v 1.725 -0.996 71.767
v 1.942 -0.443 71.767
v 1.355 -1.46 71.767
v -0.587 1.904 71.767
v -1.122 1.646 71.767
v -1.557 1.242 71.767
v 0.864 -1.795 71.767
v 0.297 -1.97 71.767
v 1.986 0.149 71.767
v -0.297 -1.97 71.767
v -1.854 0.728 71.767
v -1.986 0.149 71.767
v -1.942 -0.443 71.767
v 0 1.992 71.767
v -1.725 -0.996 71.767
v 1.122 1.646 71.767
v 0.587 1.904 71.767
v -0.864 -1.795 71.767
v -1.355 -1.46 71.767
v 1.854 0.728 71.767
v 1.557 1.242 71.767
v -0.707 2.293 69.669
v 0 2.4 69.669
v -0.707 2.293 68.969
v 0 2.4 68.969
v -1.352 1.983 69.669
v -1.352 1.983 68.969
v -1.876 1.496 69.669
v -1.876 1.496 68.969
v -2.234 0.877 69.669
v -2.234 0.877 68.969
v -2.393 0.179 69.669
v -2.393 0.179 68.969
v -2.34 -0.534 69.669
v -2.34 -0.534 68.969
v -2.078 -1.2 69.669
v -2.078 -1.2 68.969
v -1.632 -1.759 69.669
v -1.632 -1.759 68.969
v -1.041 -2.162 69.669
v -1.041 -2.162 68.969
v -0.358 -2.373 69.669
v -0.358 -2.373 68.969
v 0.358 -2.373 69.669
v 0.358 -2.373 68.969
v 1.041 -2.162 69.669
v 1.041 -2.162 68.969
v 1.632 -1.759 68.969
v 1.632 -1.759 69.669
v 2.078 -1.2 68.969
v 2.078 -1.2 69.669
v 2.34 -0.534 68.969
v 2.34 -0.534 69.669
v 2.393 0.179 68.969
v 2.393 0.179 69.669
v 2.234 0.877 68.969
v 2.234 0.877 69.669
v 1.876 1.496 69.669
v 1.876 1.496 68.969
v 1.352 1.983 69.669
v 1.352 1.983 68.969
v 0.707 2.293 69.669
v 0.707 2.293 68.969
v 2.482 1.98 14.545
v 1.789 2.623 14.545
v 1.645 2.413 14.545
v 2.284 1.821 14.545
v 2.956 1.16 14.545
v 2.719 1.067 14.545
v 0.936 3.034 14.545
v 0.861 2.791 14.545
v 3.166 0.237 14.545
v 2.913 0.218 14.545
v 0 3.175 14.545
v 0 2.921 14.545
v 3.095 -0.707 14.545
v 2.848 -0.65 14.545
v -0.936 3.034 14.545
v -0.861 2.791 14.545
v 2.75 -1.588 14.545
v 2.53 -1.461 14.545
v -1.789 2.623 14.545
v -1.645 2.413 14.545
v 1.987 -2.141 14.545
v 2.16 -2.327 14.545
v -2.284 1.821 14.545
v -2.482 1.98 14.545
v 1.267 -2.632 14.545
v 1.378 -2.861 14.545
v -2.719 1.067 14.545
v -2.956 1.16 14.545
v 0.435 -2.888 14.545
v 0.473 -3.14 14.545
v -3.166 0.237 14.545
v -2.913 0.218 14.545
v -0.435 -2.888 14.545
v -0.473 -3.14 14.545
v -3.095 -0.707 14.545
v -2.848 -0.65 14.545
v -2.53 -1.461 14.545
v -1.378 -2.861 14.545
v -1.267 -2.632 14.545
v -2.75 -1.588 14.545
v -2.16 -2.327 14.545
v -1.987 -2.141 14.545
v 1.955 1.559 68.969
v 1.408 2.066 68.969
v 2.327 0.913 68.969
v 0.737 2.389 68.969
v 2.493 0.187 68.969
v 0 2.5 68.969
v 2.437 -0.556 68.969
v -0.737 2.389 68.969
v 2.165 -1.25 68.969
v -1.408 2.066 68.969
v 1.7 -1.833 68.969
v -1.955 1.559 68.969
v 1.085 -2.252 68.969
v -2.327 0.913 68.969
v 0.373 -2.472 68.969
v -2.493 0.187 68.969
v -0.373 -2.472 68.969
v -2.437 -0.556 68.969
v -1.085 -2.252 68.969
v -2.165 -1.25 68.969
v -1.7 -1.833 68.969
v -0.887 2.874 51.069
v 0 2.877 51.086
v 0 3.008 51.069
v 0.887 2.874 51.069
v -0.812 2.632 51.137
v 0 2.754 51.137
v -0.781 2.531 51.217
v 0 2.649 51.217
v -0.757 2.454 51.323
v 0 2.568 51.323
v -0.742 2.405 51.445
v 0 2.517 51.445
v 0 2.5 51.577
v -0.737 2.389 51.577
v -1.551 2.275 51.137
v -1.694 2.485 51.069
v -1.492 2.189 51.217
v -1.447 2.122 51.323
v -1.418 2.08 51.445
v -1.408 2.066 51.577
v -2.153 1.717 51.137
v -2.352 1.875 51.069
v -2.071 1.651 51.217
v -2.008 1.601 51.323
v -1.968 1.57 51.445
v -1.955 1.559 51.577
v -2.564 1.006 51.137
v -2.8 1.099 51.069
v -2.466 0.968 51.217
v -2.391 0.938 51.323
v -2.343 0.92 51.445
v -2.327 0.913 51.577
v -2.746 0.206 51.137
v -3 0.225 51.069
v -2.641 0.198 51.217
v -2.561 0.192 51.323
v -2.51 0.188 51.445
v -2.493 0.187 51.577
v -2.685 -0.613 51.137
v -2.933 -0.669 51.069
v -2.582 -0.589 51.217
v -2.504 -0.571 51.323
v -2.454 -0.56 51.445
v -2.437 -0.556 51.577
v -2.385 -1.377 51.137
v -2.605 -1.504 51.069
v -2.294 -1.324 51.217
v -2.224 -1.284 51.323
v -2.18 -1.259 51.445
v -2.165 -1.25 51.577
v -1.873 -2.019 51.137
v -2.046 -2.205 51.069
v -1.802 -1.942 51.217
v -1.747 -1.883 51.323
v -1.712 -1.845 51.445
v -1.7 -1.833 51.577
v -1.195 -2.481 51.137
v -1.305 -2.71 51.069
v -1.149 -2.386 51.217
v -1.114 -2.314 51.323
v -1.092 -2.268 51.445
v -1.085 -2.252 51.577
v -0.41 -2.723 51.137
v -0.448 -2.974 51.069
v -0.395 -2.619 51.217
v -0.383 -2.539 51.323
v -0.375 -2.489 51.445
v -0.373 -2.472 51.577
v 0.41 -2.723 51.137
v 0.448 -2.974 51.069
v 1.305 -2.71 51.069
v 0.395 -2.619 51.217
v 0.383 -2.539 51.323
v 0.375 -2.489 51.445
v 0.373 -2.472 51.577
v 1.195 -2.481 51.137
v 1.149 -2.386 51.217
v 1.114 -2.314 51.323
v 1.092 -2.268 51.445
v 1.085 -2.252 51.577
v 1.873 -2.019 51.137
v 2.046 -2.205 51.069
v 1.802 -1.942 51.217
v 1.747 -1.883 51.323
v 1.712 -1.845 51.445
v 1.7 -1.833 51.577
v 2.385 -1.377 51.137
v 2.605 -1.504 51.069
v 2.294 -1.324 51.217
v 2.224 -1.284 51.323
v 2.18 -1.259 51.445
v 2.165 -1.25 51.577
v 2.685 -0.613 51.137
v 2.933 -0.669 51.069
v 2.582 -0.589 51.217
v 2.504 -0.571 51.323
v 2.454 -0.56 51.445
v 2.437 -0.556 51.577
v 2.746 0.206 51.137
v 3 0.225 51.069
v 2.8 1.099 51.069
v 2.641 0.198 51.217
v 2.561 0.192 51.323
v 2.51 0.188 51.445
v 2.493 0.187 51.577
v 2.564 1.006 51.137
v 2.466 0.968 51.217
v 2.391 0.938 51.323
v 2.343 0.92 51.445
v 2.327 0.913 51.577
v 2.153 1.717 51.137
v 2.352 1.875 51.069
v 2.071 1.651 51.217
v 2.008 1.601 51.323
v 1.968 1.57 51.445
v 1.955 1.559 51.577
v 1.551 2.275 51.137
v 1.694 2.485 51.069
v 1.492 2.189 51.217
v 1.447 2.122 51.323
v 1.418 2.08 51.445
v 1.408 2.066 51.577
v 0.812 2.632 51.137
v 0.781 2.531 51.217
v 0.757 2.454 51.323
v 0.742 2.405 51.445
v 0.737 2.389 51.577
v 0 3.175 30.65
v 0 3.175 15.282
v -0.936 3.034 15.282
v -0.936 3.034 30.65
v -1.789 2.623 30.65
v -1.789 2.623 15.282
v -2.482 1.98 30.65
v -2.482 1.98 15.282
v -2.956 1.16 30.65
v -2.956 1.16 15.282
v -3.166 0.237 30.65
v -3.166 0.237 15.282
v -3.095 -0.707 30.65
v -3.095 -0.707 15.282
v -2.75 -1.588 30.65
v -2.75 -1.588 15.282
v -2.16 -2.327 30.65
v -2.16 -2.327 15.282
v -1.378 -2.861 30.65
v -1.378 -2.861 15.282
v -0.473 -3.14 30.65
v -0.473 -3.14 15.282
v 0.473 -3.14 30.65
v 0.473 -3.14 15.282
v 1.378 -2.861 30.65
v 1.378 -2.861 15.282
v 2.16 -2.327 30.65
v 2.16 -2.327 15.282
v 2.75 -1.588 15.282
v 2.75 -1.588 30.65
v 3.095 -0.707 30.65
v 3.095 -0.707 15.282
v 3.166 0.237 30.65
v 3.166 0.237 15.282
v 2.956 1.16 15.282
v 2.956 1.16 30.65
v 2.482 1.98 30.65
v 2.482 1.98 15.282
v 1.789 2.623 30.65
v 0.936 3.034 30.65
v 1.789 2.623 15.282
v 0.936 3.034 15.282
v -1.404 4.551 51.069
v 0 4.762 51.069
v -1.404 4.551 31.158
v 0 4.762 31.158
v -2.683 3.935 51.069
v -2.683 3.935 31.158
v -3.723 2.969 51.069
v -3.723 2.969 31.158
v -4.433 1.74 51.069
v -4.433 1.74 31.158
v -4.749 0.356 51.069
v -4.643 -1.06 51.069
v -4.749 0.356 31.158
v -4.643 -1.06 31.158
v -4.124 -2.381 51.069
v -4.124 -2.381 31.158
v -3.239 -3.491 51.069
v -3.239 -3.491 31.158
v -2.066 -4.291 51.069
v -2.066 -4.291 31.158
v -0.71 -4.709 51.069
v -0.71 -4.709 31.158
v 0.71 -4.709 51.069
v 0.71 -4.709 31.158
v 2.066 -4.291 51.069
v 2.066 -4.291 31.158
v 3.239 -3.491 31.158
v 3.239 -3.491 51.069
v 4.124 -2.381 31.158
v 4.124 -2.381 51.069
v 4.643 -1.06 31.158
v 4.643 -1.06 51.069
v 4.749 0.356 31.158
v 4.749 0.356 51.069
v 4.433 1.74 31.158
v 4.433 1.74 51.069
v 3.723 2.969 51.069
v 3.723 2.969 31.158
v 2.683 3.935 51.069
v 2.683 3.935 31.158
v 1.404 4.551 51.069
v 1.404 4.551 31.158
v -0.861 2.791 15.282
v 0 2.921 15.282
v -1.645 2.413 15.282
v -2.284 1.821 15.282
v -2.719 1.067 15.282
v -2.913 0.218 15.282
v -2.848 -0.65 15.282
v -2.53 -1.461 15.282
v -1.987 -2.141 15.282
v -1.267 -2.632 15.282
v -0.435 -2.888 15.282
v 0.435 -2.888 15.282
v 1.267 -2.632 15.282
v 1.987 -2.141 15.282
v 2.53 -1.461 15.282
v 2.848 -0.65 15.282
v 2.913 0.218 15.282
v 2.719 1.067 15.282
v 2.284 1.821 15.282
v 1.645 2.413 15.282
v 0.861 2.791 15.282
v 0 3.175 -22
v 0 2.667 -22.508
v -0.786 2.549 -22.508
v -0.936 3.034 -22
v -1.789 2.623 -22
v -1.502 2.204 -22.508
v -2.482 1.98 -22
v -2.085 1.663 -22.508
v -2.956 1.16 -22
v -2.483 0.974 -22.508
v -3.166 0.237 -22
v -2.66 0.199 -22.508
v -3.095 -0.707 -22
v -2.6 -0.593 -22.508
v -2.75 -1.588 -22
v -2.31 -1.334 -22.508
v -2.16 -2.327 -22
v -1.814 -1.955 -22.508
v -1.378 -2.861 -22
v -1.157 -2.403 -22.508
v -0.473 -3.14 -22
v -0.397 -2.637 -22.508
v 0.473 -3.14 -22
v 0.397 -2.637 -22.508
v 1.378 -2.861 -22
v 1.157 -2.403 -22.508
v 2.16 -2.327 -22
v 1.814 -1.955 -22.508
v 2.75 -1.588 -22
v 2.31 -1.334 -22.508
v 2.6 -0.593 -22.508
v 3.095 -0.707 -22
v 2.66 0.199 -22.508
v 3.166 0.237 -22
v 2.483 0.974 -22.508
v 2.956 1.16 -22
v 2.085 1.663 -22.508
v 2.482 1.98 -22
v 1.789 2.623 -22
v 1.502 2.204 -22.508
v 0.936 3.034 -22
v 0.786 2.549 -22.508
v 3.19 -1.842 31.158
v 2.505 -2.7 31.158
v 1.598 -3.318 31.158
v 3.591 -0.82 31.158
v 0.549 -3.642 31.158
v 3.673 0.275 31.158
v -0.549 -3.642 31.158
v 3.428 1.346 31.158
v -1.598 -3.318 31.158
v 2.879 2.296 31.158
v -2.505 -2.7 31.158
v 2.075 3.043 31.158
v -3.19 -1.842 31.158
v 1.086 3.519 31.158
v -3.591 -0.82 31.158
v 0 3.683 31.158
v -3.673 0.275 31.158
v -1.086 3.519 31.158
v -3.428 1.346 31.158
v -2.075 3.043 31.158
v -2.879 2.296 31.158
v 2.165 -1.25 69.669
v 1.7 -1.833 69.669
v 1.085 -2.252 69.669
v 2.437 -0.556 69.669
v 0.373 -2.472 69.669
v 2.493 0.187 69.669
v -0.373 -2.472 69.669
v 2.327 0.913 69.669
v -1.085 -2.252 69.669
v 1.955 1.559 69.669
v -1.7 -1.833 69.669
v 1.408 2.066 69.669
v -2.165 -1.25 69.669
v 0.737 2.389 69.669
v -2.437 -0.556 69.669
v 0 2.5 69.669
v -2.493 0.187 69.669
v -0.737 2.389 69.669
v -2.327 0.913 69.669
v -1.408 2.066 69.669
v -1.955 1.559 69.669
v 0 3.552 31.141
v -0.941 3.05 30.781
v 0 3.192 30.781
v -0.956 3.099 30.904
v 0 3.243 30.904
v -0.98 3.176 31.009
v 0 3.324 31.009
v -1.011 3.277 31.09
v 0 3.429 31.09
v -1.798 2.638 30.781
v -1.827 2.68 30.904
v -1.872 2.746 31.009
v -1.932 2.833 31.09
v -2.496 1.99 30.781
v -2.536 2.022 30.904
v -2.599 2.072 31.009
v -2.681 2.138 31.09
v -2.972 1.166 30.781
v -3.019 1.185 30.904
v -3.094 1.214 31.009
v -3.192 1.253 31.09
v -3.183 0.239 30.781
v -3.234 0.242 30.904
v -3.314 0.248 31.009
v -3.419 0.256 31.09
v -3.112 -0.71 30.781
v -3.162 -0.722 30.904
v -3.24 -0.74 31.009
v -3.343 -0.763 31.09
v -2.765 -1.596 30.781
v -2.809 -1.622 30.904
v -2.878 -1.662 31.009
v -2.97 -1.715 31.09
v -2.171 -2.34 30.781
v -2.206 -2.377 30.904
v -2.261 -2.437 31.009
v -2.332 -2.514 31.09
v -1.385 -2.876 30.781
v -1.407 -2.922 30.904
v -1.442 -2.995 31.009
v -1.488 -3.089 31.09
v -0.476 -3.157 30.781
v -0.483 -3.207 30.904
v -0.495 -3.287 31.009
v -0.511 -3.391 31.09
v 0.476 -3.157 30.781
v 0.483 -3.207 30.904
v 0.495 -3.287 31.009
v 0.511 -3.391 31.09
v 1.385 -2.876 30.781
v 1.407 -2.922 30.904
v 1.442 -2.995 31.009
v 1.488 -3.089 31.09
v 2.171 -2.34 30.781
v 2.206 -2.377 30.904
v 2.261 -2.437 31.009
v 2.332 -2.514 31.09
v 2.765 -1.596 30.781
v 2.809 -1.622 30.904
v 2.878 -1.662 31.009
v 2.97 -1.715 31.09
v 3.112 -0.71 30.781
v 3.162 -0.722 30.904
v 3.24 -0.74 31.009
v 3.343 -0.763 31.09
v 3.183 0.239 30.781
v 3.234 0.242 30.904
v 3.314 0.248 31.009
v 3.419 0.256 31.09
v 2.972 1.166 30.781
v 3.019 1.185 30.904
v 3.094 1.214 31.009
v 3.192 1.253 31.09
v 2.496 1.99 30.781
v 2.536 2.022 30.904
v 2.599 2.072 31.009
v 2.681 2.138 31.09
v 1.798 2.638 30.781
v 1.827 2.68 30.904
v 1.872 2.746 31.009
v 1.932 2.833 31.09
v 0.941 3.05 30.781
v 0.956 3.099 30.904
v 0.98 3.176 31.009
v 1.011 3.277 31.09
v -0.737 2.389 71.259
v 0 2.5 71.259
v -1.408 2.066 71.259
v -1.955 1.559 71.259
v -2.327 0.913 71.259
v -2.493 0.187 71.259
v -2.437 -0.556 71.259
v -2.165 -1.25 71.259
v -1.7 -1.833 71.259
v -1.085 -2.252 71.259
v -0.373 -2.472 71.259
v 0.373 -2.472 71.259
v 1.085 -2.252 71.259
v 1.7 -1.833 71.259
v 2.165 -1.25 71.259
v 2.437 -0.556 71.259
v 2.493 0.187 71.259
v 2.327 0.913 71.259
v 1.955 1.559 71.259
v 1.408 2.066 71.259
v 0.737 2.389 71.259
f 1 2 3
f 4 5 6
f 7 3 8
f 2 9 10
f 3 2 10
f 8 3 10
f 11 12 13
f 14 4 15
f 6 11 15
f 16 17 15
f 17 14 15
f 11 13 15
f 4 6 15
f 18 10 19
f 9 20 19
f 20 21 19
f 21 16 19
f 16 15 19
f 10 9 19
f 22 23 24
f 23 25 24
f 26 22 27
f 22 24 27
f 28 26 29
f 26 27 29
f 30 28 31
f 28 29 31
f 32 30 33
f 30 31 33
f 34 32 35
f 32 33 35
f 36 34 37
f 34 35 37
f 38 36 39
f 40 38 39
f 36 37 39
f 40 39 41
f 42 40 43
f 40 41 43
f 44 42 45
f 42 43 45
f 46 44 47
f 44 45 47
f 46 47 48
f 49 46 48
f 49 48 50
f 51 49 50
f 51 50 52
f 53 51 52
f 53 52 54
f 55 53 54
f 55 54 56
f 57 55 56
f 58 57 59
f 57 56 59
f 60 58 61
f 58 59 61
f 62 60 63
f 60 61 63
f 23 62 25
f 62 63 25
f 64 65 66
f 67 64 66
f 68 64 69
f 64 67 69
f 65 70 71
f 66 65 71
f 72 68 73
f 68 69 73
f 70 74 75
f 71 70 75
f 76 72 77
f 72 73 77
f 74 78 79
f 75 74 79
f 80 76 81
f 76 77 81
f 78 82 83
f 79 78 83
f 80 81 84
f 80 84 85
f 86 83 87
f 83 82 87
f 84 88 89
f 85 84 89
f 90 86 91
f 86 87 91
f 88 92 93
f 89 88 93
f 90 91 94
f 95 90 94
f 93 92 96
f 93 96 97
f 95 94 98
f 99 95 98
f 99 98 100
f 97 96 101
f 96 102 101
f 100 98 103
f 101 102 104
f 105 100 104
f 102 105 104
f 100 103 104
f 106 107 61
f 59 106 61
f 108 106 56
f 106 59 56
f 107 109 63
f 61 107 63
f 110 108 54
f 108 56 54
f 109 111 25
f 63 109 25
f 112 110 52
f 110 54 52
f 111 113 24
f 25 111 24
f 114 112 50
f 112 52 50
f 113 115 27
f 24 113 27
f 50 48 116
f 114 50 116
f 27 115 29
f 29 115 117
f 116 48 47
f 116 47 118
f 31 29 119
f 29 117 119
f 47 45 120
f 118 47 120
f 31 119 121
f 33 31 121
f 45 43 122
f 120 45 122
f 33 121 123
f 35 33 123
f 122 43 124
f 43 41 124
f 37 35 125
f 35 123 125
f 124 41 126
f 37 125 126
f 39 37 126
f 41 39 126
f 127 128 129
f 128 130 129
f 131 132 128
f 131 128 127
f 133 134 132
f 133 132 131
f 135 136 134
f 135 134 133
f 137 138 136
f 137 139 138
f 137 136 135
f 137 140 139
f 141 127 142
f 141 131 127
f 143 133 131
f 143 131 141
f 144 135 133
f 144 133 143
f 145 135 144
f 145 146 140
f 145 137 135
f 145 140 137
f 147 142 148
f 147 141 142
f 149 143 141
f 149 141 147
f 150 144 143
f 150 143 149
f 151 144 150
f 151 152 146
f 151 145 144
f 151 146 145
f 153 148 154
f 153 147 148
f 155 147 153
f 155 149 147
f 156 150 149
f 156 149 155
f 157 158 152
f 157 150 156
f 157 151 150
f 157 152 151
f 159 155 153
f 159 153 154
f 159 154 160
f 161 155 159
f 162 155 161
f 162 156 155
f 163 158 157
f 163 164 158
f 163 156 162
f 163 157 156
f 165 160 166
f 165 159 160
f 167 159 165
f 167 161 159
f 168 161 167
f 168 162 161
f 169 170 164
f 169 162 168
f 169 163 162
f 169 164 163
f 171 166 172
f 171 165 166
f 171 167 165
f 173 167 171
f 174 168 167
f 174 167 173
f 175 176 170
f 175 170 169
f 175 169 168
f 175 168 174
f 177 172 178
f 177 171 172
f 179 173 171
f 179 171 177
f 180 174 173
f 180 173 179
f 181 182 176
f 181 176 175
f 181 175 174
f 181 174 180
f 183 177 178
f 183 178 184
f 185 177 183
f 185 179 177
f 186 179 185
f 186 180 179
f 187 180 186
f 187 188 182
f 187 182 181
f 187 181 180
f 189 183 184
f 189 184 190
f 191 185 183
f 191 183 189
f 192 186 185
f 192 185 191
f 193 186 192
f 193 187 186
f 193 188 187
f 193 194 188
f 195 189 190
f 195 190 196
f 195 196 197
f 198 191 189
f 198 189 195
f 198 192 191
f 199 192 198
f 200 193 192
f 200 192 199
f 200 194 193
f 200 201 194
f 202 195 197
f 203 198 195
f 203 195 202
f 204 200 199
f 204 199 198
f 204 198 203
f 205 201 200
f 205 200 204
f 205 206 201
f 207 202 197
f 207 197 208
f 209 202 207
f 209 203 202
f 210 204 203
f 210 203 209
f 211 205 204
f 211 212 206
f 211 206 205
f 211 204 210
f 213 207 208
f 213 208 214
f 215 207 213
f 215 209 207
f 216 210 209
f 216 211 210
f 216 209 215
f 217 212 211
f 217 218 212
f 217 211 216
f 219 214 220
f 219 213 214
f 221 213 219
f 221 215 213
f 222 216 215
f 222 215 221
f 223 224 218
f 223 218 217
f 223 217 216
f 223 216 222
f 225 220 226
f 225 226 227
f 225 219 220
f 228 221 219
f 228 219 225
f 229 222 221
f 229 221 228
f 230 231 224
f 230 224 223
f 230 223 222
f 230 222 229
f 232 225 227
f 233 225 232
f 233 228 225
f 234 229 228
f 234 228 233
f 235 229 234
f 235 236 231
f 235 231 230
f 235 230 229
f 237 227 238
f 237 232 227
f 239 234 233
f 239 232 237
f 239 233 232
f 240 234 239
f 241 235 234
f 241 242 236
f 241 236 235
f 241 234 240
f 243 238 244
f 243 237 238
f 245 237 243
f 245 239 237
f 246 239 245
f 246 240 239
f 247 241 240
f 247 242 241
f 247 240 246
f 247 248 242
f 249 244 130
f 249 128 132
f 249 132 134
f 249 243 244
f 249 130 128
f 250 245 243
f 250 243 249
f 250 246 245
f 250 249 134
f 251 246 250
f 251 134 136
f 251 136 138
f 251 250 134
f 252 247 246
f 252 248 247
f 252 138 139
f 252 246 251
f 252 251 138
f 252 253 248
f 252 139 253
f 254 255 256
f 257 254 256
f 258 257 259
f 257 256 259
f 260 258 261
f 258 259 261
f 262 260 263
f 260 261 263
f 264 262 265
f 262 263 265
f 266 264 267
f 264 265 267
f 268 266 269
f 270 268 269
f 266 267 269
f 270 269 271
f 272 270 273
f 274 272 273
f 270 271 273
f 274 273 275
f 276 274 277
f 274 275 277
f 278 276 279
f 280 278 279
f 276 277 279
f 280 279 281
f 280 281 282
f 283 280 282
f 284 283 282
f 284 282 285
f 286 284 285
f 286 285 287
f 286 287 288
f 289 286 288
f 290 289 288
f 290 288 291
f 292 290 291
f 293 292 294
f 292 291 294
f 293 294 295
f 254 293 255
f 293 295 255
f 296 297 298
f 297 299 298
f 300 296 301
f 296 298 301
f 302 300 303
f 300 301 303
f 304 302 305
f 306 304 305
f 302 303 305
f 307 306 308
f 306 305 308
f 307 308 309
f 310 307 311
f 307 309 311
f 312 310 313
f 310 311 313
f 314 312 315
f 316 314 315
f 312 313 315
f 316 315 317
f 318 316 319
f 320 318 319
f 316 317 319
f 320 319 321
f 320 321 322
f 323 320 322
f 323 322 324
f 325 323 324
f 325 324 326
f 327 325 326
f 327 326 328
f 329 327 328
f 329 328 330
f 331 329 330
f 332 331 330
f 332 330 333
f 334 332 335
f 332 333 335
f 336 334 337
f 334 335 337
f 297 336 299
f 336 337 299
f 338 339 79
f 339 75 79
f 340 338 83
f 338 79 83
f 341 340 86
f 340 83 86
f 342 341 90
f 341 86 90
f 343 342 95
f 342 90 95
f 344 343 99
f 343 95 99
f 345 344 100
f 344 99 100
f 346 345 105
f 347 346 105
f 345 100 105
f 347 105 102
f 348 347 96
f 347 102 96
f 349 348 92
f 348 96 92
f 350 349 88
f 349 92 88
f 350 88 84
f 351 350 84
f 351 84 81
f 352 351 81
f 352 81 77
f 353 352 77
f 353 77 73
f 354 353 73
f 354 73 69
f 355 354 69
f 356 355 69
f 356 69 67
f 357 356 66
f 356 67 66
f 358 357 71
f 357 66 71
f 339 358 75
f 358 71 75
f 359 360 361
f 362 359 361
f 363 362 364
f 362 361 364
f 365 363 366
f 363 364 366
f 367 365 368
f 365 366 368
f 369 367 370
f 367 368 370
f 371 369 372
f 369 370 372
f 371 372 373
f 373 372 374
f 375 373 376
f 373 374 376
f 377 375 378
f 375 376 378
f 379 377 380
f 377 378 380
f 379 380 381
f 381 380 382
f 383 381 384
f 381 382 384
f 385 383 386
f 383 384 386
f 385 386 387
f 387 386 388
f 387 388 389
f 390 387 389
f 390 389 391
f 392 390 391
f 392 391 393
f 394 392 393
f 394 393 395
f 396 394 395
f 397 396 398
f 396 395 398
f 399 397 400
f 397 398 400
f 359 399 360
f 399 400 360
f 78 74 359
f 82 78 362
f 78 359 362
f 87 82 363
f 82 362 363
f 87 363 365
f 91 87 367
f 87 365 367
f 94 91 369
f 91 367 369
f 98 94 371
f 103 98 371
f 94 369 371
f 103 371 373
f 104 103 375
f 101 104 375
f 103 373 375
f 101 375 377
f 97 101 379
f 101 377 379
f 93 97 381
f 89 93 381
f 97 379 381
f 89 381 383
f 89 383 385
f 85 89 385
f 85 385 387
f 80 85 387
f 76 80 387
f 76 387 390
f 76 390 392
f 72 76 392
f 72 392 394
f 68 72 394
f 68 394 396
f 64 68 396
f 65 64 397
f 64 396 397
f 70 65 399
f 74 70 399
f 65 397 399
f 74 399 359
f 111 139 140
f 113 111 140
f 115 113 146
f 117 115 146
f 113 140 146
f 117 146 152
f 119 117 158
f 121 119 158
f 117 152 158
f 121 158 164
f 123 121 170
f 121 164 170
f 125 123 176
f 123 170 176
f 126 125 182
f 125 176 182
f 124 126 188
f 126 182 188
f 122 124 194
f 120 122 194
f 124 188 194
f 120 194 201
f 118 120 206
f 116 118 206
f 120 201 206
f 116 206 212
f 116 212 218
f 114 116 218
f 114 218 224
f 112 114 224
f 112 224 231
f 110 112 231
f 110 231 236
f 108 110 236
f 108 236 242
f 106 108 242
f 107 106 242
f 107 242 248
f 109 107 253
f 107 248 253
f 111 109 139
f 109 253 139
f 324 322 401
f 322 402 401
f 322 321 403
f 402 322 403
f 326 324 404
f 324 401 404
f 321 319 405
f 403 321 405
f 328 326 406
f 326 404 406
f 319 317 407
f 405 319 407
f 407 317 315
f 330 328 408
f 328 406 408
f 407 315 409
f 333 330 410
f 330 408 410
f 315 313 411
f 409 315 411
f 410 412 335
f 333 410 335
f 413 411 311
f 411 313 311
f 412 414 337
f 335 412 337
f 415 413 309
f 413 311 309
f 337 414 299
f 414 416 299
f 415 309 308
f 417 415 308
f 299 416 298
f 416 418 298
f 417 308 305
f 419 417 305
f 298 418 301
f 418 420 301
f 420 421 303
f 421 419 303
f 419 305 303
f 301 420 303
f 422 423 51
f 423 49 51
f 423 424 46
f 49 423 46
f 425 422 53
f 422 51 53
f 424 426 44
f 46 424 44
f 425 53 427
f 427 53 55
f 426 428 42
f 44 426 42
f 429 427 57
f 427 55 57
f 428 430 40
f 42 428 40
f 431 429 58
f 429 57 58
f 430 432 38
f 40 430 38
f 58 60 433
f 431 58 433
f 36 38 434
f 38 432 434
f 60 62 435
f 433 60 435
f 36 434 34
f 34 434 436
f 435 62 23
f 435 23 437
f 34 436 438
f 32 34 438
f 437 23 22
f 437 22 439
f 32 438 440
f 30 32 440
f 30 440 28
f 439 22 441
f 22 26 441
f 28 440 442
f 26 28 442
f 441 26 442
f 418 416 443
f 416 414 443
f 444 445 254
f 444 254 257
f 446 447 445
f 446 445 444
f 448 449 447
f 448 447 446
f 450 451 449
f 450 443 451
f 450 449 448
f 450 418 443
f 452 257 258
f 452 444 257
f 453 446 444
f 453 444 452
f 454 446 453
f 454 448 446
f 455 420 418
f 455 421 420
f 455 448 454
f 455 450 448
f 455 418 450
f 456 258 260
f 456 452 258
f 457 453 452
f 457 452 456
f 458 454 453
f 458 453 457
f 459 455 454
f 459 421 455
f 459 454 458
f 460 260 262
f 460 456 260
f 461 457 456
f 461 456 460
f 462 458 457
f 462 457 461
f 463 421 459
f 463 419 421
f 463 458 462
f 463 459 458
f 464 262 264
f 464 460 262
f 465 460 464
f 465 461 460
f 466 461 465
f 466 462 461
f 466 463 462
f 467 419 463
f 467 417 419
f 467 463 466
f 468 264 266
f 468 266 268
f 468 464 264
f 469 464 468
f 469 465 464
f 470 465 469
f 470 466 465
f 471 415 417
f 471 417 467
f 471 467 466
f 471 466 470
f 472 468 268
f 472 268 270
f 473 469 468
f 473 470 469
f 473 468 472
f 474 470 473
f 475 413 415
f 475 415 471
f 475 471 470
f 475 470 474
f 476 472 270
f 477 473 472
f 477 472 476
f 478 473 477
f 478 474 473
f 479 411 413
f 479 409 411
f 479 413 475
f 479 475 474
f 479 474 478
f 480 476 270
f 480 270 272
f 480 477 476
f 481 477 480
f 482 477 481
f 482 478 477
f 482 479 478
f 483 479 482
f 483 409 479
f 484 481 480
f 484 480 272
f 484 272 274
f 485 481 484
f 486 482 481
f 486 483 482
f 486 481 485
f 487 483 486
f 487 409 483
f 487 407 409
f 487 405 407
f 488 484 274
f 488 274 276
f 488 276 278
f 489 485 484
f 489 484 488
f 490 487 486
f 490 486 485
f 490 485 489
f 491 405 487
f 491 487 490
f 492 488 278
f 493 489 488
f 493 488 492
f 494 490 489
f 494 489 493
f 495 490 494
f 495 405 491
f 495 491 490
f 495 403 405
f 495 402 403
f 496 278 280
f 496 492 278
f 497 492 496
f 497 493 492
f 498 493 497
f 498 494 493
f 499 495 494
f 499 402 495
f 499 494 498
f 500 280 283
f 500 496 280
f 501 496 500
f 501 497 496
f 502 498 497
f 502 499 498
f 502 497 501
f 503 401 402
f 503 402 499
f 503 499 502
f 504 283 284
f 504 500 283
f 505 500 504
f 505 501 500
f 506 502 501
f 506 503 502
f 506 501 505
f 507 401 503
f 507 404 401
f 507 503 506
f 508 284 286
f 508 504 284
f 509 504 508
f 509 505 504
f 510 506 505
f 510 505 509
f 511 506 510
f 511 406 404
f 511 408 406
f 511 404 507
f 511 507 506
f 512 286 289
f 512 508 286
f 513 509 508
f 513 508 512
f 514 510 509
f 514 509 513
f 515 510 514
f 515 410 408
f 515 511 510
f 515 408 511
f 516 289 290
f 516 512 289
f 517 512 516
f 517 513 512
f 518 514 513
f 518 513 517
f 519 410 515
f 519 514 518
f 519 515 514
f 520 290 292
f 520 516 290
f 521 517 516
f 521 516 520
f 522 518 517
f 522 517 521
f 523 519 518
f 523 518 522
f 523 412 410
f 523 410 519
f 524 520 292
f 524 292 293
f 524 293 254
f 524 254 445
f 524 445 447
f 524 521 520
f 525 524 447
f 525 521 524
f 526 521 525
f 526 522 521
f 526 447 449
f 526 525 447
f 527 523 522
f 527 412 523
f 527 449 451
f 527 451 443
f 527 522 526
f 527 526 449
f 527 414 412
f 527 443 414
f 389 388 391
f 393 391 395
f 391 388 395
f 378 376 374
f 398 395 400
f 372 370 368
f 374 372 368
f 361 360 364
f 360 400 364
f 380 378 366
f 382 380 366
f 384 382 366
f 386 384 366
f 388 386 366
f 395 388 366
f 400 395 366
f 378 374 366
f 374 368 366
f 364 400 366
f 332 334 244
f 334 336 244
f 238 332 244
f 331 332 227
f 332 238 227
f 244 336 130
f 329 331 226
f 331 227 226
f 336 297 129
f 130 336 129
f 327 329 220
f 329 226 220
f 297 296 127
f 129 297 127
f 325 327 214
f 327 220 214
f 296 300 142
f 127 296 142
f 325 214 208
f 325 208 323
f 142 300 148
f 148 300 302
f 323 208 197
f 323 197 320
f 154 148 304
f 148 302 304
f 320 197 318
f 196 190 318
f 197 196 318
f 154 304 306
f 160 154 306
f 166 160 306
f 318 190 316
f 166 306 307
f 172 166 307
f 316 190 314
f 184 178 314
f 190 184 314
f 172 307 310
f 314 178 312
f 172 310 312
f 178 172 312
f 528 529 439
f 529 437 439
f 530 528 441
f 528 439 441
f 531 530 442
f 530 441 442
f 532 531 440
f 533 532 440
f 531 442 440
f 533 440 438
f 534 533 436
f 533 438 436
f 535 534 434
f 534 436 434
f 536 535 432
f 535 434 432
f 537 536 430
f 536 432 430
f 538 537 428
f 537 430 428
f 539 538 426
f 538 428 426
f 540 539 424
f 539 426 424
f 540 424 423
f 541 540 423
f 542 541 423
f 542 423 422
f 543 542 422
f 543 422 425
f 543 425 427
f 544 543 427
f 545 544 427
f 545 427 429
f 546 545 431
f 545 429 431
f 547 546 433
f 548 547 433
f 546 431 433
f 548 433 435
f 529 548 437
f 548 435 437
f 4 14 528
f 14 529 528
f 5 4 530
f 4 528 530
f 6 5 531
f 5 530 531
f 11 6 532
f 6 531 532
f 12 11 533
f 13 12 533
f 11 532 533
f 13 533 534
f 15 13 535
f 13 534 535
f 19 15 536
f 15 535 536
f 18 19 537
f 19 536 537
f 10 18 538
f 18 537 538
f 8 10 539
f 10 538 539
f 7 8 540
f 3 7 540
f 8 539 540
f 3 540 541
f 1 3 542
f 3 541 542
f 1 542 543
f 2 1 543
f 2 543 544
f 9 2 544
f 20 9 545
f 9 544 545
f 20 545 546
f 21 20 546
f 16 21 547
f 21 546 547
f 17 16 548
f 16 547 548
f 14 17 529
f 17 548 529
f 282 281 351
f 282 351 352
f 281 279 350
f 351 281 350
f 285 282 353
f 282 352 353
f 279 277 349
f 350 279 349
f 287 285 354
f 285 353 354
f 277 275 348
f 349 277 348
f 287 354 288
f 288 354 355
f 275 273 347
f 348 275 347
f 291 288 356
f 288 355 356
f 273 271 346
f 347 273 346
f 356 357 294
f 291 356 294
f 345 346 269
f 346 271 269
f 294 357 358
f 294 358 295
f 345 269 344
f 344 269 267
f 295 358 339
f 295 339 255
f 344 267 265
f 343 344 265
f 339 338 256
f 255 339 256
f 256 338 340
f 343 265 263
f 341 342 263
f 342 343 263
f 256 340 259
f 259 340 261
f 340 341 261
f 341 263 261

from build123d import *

# Parameters (mm, degrees)
CHAMFER1_SIZE = 0.508
FILLET1_R     = 0.508


with BuildPart() as part:
    # Sketch1 → Revolve1 (revolve)
    with BuildSketch(Plane(origin=(0, 0, 0), x_dir=(0, 0, -1), z_dir=(1, 0, 0))):
        Polygon((-71.766540521, 0), (-71.766540521, 1.992), (-71.258540521, 2.5), (-69.668678408, 2.5), (-69.668678408, 2.4), (-68.968678284, 2.4), (-68.968678284, 2.5), (-51.068678408, 2.5), (-51.068678408, 4.7625), (-31.157911357, 4.7625), (-31.157911357, 3.175), (-15.281908522, 3.175), (-15.281908522, 2.921), (-14.545308522, 2.921), (-14.545308522, 3.175), (22.508173379, 3.175), (22.508173379, 0), align=None)
    revolve(axis=Axis((0, 0, 0), (0, 0, 1)))

    # Chamfer1
    chamfer1_edges = [part.edges().sort_by_distance(p)[0] for p in [
        (0, -3.175, -22.508173379),
    ]]
    chamfer(chamfer1_edges, length=CHAMFER1_SIZE)

    # Fillet1
    fillet1_edges = [part.edges().sort_by_distance(p)[0] for p in [
        (0, -3.175, 31.157911357),
        (0, -2.5, 51.068678408),
    ]]
    fillet(fillet1_edges, radius=FILLET1_R)


solid = part.part
